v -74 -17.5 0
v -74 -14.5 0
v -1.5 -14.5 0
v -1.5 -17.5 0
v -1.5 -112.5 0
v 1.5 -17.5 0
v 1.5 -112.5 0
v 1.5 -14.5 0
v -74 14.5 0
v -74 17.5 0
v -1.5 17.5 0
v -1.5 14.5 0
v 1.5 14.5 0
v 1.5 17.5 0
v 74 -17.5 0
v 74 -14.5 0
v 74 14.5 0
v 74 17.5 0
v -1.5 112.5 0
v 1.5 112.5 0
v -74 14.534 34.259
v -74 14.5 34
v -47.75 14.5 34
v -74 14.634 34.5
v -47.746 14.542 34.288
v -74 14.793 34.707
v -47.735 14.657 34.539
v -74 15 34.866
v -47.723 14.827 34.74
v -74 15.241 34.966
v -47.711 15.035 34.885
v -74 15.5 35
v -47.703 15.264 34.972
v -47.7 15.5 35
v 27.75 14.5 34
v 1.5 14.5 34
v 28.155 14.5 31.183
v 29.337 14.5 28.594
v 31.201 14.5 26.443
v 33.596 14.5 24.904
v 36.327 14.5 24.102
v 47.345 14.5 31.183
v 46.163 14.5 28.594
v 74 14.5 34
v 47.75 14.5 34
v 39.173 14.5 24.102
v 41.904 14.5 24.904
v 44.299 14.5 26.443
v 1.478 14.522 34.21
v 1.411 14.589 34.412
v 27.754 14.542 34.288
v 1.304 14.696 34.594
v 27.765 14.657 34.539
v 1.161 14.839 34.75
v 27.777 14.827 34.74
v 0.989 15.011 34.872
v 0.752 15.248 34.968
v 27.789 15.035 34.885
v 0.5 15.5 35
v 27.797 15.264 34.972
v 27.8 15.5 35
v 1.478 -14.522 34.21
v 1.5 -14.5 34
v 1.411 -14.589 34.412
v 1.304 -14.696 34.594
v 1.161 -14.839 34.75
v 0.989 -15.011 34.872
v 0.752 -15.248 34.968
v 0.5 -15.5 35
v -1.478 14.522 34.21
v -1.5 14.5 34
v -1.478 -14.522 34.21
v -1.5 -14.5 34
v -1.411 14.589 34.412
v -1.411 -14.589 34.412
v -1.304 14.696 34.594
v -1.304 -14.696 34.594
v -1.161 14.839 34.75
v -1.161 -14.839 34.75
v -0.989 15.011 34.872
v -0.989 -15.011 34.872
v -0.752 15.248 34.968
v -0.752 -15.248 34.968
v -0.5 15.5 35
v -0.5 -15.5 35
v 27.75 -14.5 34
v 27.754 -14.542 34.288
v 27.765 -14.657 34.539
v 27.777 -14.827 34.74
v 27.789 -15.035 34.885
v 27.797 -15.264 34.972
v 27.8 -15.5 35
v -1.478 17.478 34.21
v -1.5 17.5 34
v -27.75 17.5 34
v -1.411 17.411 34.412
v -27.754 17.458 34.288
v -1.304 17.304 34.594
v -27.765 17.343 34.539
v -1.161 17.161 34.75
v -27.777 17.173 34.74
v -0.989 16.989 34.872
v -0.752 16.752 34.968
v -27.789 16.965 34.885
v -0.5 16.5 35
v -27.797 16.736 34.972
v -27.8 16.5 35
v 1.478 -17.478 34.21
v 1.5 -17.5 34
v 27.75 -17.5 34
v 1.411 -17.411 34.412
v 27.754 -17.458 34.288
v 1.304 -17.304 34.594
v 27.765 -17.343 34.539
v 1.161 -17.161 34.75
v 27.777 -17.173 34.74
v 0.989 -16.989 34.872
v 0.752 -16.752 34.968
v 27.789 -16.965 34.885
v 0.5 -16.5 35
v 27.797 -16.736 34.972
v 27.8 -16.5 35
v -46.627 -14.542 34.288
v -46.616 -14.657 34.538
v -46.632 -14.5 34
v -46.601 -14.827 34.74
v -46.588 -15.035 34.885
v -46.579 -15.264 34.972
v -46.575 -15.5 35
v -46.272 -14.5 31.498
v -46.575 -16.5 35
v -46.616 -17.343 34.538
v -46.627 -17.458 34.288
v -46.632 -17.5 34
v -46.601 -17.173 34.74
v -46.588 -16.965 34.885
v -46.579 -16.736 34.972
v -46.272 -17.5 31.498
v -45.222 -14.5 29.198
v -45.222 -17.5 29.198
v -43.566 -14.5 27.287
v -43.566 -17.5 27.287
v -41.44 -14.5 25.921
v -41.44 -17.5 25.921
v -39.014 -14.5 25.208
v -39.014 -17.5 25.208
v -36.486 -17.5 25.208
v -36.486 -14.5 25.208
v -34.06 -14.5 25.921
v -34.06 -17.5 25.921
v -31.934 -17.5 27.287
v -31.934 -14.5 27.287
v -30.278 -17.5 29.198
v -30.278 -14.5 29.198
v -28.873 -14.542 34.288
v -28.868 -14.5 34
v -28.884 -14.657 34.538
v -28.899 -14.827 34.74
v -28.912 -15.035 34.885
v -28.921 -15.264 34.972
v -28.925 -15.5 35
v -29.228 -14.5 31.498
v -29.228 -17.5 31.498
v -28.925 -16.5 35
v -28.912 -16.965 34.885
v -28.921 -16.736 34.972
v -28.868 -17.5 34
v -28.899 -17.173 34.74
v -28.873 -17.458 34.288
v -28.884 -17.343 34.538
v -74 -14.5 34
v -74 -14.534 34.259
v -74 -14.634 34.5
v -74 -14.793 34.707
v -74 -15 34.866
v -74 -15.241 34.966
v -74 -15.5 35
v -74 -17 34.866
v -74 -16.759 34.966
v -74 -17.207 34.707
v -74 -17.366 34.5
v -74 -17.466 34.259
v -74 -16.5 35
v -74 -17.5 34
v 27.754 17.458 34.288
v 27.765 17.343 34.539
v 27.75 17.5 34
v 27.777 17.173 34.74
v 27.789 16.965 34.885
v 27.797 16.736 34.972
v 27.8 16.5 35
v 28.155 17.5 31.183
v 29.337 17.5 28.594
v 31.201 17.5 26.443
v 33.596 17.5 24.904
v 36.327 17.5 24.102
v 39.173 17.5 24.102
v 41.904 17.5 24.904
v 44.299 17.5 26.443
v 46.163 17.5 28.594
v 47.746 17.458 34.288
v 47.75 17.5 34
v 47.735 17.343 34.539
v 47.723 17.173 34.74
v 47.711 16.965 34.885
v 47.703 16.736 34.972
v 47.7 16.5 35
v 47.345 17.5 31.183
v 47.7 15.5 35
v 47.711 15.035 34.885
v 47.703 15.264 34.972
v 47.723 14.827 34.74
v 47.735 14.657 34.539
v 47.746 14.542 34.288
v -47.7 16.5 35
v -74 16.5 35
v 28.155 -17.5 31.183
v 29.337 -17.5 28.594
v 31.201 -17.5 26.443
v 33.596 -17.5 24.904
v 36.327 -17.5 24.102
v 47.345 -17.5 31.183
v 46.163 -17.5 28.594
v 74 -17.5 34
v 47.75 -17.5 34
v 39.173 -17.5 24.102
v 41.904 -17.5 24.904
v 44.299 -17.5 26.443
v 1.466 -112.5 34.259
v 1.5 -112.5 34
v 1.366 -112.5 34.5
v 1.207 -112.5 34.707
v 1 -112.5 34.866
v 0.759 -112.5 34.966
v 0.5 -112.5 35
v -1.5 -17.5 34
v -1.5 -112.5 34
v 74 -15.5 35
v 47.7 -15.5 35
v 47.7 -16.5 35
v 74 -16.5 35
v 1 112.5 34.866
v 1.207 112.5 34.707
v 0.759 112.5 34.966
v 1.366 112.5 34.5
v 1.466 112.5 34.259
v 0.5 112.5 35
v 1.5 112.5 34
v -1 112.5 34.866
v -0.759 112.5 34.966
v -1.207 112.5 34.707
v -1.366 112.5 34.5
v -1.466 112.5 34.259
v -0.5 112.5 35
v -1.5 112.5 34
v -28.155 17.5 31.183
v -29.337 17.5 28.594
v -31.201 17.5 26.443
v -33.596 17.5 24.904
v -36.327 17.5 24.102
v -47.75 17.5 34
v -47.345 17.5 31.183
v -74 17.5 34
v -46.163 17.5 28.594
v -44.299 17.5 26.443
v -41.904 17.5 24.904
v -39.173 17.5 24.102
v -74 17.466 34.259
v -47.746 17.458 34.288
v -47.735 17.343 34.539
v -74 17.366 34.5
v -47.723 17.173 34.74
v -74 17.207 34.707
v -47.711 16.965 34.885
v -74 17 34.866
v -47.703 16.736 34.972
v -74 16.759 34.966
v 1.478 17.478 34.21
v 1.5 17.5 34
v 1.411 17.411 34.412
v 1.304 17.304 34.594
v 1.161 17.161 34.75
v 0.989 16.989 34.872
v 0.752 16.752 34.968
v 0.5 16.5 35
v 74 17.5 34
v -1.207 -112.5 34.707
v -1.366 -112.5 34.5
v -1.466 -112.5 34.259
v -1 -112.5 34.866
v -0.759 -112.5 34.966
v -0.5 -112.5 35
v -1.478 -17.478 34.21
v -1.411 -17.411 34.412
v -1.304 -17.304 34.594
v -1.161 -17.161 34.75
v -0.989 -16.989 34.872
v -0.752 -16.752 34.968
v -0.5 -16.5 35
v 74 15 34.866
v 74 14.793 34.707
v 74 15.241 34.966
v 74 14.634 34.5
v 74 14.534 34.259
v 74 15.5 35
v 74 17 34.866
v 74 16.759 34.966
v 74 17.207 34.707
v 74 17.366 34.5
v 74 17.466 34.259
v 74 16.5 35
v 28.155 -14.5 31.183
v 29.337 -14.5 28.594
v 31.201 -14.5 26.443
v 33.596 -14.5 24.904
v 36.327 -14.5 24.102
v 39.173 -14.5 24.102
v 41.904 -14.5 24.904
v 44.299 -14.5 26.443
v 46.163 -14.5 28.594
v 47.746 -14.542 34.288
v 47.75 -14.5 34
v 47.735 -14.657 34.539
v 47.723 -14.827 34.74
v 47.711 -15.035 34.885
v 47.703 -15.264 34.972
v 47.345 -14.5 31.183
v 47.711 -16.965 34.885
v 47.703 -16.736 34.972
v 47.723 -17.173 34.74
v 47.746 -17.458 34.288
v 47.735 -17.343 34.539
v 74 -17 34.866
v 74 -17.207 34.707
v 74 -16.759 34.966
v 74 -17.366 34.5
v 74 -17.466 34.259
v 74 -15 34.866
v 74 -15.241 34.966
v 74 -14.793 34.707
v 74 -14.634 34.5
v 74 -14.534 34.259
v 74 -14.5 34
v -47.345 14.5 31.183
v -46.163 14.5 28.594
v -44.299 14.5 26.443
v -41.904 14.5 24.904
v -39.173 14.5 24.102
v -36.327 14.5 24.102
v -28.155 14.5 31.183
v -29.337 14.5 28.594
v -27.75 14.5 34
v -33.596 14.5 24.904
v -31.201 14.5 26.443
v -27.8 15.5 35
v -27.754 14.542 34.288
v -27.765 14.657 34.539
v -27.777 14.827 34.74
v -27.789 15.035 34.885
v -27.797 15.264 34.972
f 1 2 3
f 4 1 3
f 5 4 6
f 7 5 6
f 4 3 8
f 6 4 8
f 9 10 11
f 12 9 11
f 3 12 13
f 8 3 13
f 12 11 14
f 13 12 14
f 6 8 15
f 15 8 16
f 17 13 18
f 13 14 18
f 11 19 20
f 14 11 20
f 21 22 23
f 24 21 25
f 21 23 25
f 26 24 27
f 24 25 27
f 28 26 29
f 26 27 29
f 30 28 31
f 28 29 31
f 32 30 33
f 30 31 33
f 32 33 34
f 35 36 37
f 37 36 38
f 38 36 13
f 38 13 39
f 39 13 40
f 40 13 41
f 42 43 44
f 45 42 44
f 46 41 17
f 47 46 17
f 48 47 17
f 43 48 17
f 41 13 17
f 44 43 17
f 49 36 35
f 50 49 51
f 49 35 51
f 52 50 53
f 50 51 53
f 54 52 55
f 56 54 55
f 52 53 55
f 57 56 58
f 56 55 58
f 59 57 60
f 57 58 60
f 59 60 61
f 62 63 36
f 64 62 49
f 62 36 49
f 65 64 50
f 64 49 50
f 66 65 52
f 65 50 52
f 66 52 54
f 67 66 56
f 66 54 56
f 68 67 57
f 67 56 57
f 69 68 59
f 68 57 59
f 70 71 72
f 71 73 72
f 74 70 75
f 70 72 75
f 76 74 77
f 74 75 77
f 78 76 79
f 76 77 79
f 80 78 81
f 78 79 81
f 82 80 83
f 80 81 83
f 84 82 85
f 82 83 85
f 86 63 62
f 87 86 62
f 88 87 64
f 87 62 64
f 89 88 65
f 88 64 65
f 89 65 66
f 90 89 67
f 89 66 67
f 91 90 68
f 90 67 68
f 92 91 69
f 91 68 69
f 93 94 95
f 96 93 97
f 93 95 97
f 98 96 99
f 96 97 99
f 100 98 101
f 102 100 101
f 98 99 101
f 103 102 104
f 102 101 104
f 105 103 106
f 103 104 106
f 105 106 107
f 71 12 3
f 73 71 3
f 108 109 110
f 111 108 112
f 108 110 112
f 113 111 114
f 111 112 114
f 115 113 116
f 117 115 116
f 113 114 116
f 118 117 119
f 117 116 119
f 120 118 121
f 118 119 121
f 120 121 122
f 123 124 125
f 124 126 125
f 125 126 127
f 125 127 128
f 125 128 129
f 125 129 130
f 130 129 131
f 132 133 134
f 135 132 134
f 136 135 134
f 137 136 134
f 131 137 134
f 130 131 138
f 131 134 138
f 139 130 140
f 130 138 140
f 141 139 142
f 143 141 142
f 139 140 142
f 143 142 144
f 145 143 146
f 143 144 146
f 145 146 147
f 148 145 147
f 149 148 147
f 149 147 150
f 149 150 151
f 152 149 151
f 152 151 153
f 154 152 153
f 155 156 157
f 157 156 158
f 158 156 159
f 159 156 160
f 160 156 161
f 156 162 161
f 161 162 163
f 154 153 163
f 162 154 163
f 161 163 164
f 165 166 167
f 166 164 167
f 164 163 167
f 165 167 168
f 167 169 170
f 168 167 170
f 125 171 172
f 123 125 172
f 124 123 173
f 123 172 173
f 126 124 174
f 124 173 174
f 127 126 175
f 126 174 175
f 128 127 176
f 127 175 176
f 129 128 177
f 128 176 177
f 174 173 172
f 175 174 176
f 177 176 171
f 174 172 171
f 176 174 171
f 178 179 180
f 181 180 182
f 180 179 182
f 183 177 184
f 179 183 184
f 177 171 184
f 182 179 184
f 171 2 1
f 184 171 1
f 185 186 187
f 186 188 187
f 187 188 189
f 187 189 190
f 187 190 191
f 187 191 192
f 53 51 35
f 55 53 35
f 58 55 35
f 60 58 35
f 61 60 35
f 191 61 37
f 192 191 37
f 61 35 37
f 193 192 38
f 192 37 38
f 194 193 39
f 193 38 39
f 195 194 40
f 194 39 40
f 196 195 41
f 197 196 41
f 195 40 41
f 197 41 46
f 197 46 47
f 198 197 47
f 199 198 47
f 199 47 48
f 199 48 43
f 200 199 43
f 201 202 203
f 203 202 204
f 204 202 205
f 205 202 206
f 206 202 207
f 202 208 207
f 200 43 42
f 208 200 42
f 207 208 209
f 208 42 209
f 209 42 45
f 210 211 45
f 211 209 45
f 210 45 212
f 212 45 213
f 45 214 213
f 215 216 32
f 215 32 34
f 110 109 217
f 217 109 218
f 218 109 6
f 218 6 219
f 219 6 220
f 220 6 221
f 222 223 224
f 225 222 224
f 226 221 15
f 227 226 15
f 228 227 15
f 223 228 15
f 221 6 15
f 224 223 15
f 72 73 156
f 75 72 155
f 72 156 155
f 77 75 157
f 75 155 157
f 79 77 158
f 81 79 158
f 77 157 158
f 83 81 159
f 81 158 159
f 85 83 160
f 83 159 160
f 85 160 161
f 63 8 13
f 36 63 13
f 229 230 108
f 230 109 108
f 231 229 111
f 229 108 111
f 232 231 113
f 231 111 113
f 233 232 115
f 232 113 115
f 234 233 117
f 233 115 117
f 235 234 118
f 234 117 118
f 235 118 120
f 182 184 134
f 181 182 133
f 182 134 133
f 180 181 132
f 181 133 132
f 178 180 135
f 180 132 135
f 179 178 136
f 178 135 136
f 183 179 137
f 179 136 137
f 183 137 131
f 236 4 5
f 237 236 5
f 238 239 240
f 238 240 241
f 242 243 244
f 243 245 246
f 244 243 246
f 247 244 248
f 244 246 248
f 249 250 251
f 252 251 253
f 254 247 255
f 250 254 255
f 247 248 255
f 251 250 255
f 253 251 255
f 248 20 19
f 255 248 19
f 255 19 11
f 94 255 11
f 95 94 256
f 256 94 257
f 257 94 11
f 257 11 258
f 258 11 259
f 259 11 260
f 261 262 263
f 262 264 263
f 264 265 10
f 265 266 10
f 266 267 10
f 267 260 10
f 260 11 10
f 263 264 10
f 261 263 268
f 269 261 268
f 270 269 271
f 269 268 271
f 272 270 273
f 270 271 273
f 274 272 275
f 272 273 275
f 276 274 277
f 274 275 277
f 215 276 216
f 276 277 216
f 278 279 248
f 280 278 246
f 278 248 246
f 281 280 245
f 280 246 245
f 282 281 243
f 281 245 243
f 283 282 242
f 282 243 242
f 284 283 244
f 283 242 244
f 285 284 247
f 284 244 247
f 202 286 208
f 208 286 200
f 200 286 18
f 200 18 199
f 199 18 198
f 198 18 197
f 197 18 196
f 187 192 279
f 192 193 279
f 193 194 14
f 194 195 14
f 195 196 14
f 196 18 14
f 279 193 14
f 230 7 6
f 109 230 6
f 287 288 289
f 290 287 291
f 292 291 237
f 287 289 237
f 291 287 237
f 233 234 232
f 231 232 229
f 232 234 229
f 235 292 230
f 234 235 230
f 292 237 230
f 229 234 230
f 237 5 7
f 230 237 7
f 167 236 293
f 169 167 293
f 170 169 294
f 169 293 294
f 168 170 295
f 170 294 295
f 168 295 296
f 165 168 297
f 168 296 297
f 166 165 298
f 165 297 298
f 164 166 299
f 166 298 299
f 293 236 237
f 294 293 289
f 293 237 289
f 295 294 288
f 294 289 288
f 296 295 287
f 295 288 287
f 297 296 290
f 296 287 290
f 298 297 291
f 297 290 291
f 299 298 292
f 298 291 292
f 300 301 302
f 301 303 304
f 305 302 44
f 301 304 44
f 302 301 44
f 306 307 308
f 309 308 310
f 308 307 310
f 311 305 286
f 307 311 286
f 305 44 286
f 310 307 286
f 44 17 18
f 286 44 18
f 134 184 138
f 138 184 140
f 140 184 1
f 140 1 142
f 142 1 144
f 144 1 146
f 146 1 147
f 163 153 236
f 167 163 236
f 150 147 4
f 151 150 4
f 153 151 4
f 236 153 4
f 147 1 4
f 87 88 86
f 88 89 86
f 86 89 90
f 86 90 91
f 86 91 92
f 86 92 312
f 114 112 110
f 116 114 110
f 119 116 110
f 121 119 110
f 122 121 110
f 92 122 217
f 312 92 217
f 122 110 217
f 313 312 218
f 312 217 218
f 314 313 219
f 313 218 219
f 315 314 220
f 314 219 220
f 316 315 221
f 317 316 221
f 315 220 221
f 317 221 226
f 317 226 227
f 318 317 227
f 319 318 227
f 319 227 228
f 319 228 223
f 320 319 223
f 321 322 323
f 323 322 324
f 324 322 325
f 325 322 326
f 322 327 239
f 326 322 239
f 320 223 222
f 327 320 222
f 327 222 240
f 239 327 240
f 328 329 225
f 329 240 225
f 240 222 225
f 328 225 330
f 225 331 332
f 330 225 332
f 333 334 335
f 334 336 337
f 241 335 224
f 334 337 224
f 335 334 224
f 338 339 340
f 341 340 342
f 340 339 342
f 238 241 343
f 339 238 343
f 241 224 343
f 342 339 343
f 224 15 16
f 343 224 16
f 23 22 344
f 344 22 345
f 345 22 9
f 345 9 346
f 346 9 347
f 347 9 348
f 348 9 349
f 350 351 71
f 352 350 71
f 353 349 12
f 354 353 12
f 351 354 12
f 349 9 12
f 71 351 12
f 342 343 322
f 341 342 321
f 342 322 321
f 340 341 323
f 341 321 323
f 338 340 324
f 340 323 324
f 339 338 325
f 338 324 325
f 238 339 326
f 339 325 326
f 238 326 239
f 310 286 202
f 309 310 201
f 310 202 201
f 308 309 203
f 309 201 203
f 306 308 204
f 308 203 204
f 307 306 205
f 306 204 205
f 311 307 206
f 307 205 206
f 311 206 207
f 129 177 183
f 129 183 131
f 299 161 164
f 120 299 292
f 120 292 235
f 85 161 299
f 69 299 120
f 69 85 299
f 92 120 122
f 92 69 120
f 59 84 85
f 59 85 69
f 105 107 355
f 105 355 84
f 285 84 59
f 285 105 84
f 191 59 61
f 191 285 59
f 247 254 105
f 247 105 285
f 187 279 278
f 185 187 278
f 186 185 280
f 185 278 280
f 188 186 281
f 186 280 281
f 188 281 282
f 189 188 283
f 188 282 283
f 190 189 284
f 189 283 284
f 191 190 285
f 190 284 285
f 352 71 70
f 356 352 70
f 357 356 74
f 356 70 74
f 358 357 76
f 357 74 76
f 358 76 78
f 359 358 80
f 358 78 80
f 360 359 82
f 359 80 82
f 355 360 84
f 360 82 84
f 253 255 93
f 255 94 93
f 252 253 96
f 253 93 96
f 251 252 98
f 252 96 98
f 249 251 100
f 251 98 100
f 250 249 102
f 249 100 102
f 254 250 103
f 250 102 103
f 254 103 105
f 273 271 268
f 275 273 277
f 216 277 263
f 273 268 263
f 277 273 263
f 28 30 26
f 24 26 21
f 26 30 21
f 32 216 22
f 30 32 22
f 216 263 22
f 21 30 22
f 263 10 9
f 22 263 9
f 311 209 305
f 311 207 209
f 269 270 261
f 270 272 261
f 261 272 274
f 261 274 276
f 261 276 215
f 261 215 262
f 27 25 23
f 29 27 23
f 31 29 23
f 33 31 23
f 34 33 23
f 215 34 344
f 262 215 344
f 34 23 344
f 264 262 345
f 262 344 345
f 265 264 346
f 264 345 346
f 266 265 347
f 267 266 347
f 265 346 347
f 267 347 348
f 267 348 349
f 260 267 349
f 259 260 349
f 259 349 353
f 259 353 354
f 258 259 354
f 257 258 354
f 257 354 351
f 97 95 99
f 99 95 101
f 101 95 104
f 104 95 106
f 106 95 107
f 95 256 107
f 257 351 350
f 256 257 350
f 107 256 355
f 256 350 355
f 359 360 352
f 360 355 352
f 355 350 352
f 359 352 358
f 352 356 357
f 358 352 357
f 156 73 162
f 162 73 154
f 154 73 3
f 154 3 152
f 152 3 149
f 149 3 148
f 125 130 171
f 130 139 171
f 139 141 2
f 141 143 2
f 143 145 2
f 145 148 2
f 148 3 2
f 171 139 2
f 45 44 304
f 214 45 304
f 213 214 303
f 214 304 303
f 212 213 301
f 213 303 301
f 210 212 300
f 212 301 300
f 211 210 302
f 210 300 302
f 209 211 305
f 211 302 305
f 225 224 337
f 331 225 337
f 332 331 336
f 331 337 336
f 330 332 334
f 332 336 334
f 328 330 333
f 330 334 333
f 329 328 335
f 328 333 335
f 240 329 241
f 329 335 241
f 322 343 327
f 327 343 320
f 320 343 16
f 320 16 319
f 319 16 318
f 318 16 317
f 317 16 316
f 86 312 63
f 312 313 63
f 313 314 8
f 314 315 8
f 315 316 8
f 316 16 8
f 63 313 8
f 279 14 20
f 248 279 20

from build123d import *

# Parameters (mm, degrees)
F1_DEPTH  = 35
F2_R      = 1
F4_DEPTH  = 25
F6_DEPTH  = 25
F8_DEPTH  = 25
F10_DEPTH = 25


with BuildPart() as f1:
    # F0 (on Top) → F1 (new body)
    with BuildSketch(Plane.XY):
        Polygon((1.5, 17.5), (1.5, 112.5), (-1.5, 112.5), (-1.5, 17.5), (-74, 17.5), (-74, 14.5), (-1.5, 14.5), (-1.5, -14.5), (-74, -14.5), (-74, -17.5), (-1.5, -17.5), (-1.5, -112.5), (1.5, -112.5), (1.5, -17.5), (74, -17.5), (74, -14.5), (1.5, -14.5), (1.5, 14.5), (74, 14.5), (74, 17.5), align=None)
    extrude(amount=F1_DEPTH)

    # F2
    f2_edges = [f1.edges().sort_by_distance(p)[0] for p in [
        (-37.75, 14.5, 35),
        (-1.5, 65, 35),
        (-37.75, 17.5, 35),
        (1.5, 65, 35),
        (37.75, 17.5, 35),
        (37.75, 14.5, 35),
        (1.5, 0, 35),
        (-1.5, 0, 35),
        (-37.75, -14.5, 35),
        (-37.75, -17.5, 35),
        (37.75, -14.5, 35),
        (37.75, -17.5, 35),
        (-1.5, -65, 35),
        (1.5, -65, 35),
    ]]
    fillet(f2_edges, radius=F2_R)

    # F3 (on face) → F4 (cut)
    with BuildSketch(Plane.XZ.offset(17.5)):
        with BuildLine():
            ThreePointArc((-46.6319660113, 34), (-37.75, 25.1180339887), (-28.8680339887, 34))
            Line((-28.8680339887, 34), (-46.6319660113, 34))
        make_face()
        with BuildLine():
            Line((-46.6319660113, 34), (-28.8680339887, 34))
            ThreePointArc((-28.8680339887, 34), (-37.75, 42.8819660113), (-46.6319660113, 34))
        make_face()
    extrude(amount=-F4_DEPTH, mode=Mode.SUBTRACT)

    # F5 (on face) → F6 (cut)
    with BuildSketch(Plane.XZ.offset(-14.5)):
        with BuildLine():
            ThreePointArc((-47.75, 34), (-37.75, 24), (-27.75, 34))
            Line((-27.75, 34), (-47.75, 34))
        make_face()
        with BuildLine():
            Line((-47.75, 34), (-27.75, 34))
            ThreePointArc((-27.75, 34), (-37.75, 44), (-47.75, 34))
        make_face()
    extrude(amount=-F6_DEPTH, mode=Mode.SUBTRACT)

    # F7 (on face) → F8 (cut)
    with BuildSketch(Plane.XZ.offset(17.5)):
        with BuildLine():
            Line((27.75, 34), (47.75, 34))
            ThreePointArc((47.75, 34), (37.75, 44), (27.75, 34))
        make_face()
        with BuildLine():
            ThreePointArc((27.75, 34), (37.75, 24), (47.75, 34))
            Line((47.75, 34), (27.75, 34))
        make_face()
    extrude(amount=-F8_DEPTH, mode=Mode.SUBTRACT)

    # F9 (on face) → F10 (cut)
    with BuildSketch(Plane.XZ.offset(-14.5)):
        with BuildLine():
            Line((27.75, 34), (47.75, 34))
            ThreePointArc((47.75, 34), (37.75, 44), (27.75, 34))
        make_face()
        with BuildLine():
            ThreePointArc((27.75, 34), (37.75, 24), (47.75, 34))
            Line((47.75, 34), (27.75, 34))
        make_face()
    extrude(amount=-F10_DEPTH, mode=Mode.SUBTRACT)


solid = f1.part
